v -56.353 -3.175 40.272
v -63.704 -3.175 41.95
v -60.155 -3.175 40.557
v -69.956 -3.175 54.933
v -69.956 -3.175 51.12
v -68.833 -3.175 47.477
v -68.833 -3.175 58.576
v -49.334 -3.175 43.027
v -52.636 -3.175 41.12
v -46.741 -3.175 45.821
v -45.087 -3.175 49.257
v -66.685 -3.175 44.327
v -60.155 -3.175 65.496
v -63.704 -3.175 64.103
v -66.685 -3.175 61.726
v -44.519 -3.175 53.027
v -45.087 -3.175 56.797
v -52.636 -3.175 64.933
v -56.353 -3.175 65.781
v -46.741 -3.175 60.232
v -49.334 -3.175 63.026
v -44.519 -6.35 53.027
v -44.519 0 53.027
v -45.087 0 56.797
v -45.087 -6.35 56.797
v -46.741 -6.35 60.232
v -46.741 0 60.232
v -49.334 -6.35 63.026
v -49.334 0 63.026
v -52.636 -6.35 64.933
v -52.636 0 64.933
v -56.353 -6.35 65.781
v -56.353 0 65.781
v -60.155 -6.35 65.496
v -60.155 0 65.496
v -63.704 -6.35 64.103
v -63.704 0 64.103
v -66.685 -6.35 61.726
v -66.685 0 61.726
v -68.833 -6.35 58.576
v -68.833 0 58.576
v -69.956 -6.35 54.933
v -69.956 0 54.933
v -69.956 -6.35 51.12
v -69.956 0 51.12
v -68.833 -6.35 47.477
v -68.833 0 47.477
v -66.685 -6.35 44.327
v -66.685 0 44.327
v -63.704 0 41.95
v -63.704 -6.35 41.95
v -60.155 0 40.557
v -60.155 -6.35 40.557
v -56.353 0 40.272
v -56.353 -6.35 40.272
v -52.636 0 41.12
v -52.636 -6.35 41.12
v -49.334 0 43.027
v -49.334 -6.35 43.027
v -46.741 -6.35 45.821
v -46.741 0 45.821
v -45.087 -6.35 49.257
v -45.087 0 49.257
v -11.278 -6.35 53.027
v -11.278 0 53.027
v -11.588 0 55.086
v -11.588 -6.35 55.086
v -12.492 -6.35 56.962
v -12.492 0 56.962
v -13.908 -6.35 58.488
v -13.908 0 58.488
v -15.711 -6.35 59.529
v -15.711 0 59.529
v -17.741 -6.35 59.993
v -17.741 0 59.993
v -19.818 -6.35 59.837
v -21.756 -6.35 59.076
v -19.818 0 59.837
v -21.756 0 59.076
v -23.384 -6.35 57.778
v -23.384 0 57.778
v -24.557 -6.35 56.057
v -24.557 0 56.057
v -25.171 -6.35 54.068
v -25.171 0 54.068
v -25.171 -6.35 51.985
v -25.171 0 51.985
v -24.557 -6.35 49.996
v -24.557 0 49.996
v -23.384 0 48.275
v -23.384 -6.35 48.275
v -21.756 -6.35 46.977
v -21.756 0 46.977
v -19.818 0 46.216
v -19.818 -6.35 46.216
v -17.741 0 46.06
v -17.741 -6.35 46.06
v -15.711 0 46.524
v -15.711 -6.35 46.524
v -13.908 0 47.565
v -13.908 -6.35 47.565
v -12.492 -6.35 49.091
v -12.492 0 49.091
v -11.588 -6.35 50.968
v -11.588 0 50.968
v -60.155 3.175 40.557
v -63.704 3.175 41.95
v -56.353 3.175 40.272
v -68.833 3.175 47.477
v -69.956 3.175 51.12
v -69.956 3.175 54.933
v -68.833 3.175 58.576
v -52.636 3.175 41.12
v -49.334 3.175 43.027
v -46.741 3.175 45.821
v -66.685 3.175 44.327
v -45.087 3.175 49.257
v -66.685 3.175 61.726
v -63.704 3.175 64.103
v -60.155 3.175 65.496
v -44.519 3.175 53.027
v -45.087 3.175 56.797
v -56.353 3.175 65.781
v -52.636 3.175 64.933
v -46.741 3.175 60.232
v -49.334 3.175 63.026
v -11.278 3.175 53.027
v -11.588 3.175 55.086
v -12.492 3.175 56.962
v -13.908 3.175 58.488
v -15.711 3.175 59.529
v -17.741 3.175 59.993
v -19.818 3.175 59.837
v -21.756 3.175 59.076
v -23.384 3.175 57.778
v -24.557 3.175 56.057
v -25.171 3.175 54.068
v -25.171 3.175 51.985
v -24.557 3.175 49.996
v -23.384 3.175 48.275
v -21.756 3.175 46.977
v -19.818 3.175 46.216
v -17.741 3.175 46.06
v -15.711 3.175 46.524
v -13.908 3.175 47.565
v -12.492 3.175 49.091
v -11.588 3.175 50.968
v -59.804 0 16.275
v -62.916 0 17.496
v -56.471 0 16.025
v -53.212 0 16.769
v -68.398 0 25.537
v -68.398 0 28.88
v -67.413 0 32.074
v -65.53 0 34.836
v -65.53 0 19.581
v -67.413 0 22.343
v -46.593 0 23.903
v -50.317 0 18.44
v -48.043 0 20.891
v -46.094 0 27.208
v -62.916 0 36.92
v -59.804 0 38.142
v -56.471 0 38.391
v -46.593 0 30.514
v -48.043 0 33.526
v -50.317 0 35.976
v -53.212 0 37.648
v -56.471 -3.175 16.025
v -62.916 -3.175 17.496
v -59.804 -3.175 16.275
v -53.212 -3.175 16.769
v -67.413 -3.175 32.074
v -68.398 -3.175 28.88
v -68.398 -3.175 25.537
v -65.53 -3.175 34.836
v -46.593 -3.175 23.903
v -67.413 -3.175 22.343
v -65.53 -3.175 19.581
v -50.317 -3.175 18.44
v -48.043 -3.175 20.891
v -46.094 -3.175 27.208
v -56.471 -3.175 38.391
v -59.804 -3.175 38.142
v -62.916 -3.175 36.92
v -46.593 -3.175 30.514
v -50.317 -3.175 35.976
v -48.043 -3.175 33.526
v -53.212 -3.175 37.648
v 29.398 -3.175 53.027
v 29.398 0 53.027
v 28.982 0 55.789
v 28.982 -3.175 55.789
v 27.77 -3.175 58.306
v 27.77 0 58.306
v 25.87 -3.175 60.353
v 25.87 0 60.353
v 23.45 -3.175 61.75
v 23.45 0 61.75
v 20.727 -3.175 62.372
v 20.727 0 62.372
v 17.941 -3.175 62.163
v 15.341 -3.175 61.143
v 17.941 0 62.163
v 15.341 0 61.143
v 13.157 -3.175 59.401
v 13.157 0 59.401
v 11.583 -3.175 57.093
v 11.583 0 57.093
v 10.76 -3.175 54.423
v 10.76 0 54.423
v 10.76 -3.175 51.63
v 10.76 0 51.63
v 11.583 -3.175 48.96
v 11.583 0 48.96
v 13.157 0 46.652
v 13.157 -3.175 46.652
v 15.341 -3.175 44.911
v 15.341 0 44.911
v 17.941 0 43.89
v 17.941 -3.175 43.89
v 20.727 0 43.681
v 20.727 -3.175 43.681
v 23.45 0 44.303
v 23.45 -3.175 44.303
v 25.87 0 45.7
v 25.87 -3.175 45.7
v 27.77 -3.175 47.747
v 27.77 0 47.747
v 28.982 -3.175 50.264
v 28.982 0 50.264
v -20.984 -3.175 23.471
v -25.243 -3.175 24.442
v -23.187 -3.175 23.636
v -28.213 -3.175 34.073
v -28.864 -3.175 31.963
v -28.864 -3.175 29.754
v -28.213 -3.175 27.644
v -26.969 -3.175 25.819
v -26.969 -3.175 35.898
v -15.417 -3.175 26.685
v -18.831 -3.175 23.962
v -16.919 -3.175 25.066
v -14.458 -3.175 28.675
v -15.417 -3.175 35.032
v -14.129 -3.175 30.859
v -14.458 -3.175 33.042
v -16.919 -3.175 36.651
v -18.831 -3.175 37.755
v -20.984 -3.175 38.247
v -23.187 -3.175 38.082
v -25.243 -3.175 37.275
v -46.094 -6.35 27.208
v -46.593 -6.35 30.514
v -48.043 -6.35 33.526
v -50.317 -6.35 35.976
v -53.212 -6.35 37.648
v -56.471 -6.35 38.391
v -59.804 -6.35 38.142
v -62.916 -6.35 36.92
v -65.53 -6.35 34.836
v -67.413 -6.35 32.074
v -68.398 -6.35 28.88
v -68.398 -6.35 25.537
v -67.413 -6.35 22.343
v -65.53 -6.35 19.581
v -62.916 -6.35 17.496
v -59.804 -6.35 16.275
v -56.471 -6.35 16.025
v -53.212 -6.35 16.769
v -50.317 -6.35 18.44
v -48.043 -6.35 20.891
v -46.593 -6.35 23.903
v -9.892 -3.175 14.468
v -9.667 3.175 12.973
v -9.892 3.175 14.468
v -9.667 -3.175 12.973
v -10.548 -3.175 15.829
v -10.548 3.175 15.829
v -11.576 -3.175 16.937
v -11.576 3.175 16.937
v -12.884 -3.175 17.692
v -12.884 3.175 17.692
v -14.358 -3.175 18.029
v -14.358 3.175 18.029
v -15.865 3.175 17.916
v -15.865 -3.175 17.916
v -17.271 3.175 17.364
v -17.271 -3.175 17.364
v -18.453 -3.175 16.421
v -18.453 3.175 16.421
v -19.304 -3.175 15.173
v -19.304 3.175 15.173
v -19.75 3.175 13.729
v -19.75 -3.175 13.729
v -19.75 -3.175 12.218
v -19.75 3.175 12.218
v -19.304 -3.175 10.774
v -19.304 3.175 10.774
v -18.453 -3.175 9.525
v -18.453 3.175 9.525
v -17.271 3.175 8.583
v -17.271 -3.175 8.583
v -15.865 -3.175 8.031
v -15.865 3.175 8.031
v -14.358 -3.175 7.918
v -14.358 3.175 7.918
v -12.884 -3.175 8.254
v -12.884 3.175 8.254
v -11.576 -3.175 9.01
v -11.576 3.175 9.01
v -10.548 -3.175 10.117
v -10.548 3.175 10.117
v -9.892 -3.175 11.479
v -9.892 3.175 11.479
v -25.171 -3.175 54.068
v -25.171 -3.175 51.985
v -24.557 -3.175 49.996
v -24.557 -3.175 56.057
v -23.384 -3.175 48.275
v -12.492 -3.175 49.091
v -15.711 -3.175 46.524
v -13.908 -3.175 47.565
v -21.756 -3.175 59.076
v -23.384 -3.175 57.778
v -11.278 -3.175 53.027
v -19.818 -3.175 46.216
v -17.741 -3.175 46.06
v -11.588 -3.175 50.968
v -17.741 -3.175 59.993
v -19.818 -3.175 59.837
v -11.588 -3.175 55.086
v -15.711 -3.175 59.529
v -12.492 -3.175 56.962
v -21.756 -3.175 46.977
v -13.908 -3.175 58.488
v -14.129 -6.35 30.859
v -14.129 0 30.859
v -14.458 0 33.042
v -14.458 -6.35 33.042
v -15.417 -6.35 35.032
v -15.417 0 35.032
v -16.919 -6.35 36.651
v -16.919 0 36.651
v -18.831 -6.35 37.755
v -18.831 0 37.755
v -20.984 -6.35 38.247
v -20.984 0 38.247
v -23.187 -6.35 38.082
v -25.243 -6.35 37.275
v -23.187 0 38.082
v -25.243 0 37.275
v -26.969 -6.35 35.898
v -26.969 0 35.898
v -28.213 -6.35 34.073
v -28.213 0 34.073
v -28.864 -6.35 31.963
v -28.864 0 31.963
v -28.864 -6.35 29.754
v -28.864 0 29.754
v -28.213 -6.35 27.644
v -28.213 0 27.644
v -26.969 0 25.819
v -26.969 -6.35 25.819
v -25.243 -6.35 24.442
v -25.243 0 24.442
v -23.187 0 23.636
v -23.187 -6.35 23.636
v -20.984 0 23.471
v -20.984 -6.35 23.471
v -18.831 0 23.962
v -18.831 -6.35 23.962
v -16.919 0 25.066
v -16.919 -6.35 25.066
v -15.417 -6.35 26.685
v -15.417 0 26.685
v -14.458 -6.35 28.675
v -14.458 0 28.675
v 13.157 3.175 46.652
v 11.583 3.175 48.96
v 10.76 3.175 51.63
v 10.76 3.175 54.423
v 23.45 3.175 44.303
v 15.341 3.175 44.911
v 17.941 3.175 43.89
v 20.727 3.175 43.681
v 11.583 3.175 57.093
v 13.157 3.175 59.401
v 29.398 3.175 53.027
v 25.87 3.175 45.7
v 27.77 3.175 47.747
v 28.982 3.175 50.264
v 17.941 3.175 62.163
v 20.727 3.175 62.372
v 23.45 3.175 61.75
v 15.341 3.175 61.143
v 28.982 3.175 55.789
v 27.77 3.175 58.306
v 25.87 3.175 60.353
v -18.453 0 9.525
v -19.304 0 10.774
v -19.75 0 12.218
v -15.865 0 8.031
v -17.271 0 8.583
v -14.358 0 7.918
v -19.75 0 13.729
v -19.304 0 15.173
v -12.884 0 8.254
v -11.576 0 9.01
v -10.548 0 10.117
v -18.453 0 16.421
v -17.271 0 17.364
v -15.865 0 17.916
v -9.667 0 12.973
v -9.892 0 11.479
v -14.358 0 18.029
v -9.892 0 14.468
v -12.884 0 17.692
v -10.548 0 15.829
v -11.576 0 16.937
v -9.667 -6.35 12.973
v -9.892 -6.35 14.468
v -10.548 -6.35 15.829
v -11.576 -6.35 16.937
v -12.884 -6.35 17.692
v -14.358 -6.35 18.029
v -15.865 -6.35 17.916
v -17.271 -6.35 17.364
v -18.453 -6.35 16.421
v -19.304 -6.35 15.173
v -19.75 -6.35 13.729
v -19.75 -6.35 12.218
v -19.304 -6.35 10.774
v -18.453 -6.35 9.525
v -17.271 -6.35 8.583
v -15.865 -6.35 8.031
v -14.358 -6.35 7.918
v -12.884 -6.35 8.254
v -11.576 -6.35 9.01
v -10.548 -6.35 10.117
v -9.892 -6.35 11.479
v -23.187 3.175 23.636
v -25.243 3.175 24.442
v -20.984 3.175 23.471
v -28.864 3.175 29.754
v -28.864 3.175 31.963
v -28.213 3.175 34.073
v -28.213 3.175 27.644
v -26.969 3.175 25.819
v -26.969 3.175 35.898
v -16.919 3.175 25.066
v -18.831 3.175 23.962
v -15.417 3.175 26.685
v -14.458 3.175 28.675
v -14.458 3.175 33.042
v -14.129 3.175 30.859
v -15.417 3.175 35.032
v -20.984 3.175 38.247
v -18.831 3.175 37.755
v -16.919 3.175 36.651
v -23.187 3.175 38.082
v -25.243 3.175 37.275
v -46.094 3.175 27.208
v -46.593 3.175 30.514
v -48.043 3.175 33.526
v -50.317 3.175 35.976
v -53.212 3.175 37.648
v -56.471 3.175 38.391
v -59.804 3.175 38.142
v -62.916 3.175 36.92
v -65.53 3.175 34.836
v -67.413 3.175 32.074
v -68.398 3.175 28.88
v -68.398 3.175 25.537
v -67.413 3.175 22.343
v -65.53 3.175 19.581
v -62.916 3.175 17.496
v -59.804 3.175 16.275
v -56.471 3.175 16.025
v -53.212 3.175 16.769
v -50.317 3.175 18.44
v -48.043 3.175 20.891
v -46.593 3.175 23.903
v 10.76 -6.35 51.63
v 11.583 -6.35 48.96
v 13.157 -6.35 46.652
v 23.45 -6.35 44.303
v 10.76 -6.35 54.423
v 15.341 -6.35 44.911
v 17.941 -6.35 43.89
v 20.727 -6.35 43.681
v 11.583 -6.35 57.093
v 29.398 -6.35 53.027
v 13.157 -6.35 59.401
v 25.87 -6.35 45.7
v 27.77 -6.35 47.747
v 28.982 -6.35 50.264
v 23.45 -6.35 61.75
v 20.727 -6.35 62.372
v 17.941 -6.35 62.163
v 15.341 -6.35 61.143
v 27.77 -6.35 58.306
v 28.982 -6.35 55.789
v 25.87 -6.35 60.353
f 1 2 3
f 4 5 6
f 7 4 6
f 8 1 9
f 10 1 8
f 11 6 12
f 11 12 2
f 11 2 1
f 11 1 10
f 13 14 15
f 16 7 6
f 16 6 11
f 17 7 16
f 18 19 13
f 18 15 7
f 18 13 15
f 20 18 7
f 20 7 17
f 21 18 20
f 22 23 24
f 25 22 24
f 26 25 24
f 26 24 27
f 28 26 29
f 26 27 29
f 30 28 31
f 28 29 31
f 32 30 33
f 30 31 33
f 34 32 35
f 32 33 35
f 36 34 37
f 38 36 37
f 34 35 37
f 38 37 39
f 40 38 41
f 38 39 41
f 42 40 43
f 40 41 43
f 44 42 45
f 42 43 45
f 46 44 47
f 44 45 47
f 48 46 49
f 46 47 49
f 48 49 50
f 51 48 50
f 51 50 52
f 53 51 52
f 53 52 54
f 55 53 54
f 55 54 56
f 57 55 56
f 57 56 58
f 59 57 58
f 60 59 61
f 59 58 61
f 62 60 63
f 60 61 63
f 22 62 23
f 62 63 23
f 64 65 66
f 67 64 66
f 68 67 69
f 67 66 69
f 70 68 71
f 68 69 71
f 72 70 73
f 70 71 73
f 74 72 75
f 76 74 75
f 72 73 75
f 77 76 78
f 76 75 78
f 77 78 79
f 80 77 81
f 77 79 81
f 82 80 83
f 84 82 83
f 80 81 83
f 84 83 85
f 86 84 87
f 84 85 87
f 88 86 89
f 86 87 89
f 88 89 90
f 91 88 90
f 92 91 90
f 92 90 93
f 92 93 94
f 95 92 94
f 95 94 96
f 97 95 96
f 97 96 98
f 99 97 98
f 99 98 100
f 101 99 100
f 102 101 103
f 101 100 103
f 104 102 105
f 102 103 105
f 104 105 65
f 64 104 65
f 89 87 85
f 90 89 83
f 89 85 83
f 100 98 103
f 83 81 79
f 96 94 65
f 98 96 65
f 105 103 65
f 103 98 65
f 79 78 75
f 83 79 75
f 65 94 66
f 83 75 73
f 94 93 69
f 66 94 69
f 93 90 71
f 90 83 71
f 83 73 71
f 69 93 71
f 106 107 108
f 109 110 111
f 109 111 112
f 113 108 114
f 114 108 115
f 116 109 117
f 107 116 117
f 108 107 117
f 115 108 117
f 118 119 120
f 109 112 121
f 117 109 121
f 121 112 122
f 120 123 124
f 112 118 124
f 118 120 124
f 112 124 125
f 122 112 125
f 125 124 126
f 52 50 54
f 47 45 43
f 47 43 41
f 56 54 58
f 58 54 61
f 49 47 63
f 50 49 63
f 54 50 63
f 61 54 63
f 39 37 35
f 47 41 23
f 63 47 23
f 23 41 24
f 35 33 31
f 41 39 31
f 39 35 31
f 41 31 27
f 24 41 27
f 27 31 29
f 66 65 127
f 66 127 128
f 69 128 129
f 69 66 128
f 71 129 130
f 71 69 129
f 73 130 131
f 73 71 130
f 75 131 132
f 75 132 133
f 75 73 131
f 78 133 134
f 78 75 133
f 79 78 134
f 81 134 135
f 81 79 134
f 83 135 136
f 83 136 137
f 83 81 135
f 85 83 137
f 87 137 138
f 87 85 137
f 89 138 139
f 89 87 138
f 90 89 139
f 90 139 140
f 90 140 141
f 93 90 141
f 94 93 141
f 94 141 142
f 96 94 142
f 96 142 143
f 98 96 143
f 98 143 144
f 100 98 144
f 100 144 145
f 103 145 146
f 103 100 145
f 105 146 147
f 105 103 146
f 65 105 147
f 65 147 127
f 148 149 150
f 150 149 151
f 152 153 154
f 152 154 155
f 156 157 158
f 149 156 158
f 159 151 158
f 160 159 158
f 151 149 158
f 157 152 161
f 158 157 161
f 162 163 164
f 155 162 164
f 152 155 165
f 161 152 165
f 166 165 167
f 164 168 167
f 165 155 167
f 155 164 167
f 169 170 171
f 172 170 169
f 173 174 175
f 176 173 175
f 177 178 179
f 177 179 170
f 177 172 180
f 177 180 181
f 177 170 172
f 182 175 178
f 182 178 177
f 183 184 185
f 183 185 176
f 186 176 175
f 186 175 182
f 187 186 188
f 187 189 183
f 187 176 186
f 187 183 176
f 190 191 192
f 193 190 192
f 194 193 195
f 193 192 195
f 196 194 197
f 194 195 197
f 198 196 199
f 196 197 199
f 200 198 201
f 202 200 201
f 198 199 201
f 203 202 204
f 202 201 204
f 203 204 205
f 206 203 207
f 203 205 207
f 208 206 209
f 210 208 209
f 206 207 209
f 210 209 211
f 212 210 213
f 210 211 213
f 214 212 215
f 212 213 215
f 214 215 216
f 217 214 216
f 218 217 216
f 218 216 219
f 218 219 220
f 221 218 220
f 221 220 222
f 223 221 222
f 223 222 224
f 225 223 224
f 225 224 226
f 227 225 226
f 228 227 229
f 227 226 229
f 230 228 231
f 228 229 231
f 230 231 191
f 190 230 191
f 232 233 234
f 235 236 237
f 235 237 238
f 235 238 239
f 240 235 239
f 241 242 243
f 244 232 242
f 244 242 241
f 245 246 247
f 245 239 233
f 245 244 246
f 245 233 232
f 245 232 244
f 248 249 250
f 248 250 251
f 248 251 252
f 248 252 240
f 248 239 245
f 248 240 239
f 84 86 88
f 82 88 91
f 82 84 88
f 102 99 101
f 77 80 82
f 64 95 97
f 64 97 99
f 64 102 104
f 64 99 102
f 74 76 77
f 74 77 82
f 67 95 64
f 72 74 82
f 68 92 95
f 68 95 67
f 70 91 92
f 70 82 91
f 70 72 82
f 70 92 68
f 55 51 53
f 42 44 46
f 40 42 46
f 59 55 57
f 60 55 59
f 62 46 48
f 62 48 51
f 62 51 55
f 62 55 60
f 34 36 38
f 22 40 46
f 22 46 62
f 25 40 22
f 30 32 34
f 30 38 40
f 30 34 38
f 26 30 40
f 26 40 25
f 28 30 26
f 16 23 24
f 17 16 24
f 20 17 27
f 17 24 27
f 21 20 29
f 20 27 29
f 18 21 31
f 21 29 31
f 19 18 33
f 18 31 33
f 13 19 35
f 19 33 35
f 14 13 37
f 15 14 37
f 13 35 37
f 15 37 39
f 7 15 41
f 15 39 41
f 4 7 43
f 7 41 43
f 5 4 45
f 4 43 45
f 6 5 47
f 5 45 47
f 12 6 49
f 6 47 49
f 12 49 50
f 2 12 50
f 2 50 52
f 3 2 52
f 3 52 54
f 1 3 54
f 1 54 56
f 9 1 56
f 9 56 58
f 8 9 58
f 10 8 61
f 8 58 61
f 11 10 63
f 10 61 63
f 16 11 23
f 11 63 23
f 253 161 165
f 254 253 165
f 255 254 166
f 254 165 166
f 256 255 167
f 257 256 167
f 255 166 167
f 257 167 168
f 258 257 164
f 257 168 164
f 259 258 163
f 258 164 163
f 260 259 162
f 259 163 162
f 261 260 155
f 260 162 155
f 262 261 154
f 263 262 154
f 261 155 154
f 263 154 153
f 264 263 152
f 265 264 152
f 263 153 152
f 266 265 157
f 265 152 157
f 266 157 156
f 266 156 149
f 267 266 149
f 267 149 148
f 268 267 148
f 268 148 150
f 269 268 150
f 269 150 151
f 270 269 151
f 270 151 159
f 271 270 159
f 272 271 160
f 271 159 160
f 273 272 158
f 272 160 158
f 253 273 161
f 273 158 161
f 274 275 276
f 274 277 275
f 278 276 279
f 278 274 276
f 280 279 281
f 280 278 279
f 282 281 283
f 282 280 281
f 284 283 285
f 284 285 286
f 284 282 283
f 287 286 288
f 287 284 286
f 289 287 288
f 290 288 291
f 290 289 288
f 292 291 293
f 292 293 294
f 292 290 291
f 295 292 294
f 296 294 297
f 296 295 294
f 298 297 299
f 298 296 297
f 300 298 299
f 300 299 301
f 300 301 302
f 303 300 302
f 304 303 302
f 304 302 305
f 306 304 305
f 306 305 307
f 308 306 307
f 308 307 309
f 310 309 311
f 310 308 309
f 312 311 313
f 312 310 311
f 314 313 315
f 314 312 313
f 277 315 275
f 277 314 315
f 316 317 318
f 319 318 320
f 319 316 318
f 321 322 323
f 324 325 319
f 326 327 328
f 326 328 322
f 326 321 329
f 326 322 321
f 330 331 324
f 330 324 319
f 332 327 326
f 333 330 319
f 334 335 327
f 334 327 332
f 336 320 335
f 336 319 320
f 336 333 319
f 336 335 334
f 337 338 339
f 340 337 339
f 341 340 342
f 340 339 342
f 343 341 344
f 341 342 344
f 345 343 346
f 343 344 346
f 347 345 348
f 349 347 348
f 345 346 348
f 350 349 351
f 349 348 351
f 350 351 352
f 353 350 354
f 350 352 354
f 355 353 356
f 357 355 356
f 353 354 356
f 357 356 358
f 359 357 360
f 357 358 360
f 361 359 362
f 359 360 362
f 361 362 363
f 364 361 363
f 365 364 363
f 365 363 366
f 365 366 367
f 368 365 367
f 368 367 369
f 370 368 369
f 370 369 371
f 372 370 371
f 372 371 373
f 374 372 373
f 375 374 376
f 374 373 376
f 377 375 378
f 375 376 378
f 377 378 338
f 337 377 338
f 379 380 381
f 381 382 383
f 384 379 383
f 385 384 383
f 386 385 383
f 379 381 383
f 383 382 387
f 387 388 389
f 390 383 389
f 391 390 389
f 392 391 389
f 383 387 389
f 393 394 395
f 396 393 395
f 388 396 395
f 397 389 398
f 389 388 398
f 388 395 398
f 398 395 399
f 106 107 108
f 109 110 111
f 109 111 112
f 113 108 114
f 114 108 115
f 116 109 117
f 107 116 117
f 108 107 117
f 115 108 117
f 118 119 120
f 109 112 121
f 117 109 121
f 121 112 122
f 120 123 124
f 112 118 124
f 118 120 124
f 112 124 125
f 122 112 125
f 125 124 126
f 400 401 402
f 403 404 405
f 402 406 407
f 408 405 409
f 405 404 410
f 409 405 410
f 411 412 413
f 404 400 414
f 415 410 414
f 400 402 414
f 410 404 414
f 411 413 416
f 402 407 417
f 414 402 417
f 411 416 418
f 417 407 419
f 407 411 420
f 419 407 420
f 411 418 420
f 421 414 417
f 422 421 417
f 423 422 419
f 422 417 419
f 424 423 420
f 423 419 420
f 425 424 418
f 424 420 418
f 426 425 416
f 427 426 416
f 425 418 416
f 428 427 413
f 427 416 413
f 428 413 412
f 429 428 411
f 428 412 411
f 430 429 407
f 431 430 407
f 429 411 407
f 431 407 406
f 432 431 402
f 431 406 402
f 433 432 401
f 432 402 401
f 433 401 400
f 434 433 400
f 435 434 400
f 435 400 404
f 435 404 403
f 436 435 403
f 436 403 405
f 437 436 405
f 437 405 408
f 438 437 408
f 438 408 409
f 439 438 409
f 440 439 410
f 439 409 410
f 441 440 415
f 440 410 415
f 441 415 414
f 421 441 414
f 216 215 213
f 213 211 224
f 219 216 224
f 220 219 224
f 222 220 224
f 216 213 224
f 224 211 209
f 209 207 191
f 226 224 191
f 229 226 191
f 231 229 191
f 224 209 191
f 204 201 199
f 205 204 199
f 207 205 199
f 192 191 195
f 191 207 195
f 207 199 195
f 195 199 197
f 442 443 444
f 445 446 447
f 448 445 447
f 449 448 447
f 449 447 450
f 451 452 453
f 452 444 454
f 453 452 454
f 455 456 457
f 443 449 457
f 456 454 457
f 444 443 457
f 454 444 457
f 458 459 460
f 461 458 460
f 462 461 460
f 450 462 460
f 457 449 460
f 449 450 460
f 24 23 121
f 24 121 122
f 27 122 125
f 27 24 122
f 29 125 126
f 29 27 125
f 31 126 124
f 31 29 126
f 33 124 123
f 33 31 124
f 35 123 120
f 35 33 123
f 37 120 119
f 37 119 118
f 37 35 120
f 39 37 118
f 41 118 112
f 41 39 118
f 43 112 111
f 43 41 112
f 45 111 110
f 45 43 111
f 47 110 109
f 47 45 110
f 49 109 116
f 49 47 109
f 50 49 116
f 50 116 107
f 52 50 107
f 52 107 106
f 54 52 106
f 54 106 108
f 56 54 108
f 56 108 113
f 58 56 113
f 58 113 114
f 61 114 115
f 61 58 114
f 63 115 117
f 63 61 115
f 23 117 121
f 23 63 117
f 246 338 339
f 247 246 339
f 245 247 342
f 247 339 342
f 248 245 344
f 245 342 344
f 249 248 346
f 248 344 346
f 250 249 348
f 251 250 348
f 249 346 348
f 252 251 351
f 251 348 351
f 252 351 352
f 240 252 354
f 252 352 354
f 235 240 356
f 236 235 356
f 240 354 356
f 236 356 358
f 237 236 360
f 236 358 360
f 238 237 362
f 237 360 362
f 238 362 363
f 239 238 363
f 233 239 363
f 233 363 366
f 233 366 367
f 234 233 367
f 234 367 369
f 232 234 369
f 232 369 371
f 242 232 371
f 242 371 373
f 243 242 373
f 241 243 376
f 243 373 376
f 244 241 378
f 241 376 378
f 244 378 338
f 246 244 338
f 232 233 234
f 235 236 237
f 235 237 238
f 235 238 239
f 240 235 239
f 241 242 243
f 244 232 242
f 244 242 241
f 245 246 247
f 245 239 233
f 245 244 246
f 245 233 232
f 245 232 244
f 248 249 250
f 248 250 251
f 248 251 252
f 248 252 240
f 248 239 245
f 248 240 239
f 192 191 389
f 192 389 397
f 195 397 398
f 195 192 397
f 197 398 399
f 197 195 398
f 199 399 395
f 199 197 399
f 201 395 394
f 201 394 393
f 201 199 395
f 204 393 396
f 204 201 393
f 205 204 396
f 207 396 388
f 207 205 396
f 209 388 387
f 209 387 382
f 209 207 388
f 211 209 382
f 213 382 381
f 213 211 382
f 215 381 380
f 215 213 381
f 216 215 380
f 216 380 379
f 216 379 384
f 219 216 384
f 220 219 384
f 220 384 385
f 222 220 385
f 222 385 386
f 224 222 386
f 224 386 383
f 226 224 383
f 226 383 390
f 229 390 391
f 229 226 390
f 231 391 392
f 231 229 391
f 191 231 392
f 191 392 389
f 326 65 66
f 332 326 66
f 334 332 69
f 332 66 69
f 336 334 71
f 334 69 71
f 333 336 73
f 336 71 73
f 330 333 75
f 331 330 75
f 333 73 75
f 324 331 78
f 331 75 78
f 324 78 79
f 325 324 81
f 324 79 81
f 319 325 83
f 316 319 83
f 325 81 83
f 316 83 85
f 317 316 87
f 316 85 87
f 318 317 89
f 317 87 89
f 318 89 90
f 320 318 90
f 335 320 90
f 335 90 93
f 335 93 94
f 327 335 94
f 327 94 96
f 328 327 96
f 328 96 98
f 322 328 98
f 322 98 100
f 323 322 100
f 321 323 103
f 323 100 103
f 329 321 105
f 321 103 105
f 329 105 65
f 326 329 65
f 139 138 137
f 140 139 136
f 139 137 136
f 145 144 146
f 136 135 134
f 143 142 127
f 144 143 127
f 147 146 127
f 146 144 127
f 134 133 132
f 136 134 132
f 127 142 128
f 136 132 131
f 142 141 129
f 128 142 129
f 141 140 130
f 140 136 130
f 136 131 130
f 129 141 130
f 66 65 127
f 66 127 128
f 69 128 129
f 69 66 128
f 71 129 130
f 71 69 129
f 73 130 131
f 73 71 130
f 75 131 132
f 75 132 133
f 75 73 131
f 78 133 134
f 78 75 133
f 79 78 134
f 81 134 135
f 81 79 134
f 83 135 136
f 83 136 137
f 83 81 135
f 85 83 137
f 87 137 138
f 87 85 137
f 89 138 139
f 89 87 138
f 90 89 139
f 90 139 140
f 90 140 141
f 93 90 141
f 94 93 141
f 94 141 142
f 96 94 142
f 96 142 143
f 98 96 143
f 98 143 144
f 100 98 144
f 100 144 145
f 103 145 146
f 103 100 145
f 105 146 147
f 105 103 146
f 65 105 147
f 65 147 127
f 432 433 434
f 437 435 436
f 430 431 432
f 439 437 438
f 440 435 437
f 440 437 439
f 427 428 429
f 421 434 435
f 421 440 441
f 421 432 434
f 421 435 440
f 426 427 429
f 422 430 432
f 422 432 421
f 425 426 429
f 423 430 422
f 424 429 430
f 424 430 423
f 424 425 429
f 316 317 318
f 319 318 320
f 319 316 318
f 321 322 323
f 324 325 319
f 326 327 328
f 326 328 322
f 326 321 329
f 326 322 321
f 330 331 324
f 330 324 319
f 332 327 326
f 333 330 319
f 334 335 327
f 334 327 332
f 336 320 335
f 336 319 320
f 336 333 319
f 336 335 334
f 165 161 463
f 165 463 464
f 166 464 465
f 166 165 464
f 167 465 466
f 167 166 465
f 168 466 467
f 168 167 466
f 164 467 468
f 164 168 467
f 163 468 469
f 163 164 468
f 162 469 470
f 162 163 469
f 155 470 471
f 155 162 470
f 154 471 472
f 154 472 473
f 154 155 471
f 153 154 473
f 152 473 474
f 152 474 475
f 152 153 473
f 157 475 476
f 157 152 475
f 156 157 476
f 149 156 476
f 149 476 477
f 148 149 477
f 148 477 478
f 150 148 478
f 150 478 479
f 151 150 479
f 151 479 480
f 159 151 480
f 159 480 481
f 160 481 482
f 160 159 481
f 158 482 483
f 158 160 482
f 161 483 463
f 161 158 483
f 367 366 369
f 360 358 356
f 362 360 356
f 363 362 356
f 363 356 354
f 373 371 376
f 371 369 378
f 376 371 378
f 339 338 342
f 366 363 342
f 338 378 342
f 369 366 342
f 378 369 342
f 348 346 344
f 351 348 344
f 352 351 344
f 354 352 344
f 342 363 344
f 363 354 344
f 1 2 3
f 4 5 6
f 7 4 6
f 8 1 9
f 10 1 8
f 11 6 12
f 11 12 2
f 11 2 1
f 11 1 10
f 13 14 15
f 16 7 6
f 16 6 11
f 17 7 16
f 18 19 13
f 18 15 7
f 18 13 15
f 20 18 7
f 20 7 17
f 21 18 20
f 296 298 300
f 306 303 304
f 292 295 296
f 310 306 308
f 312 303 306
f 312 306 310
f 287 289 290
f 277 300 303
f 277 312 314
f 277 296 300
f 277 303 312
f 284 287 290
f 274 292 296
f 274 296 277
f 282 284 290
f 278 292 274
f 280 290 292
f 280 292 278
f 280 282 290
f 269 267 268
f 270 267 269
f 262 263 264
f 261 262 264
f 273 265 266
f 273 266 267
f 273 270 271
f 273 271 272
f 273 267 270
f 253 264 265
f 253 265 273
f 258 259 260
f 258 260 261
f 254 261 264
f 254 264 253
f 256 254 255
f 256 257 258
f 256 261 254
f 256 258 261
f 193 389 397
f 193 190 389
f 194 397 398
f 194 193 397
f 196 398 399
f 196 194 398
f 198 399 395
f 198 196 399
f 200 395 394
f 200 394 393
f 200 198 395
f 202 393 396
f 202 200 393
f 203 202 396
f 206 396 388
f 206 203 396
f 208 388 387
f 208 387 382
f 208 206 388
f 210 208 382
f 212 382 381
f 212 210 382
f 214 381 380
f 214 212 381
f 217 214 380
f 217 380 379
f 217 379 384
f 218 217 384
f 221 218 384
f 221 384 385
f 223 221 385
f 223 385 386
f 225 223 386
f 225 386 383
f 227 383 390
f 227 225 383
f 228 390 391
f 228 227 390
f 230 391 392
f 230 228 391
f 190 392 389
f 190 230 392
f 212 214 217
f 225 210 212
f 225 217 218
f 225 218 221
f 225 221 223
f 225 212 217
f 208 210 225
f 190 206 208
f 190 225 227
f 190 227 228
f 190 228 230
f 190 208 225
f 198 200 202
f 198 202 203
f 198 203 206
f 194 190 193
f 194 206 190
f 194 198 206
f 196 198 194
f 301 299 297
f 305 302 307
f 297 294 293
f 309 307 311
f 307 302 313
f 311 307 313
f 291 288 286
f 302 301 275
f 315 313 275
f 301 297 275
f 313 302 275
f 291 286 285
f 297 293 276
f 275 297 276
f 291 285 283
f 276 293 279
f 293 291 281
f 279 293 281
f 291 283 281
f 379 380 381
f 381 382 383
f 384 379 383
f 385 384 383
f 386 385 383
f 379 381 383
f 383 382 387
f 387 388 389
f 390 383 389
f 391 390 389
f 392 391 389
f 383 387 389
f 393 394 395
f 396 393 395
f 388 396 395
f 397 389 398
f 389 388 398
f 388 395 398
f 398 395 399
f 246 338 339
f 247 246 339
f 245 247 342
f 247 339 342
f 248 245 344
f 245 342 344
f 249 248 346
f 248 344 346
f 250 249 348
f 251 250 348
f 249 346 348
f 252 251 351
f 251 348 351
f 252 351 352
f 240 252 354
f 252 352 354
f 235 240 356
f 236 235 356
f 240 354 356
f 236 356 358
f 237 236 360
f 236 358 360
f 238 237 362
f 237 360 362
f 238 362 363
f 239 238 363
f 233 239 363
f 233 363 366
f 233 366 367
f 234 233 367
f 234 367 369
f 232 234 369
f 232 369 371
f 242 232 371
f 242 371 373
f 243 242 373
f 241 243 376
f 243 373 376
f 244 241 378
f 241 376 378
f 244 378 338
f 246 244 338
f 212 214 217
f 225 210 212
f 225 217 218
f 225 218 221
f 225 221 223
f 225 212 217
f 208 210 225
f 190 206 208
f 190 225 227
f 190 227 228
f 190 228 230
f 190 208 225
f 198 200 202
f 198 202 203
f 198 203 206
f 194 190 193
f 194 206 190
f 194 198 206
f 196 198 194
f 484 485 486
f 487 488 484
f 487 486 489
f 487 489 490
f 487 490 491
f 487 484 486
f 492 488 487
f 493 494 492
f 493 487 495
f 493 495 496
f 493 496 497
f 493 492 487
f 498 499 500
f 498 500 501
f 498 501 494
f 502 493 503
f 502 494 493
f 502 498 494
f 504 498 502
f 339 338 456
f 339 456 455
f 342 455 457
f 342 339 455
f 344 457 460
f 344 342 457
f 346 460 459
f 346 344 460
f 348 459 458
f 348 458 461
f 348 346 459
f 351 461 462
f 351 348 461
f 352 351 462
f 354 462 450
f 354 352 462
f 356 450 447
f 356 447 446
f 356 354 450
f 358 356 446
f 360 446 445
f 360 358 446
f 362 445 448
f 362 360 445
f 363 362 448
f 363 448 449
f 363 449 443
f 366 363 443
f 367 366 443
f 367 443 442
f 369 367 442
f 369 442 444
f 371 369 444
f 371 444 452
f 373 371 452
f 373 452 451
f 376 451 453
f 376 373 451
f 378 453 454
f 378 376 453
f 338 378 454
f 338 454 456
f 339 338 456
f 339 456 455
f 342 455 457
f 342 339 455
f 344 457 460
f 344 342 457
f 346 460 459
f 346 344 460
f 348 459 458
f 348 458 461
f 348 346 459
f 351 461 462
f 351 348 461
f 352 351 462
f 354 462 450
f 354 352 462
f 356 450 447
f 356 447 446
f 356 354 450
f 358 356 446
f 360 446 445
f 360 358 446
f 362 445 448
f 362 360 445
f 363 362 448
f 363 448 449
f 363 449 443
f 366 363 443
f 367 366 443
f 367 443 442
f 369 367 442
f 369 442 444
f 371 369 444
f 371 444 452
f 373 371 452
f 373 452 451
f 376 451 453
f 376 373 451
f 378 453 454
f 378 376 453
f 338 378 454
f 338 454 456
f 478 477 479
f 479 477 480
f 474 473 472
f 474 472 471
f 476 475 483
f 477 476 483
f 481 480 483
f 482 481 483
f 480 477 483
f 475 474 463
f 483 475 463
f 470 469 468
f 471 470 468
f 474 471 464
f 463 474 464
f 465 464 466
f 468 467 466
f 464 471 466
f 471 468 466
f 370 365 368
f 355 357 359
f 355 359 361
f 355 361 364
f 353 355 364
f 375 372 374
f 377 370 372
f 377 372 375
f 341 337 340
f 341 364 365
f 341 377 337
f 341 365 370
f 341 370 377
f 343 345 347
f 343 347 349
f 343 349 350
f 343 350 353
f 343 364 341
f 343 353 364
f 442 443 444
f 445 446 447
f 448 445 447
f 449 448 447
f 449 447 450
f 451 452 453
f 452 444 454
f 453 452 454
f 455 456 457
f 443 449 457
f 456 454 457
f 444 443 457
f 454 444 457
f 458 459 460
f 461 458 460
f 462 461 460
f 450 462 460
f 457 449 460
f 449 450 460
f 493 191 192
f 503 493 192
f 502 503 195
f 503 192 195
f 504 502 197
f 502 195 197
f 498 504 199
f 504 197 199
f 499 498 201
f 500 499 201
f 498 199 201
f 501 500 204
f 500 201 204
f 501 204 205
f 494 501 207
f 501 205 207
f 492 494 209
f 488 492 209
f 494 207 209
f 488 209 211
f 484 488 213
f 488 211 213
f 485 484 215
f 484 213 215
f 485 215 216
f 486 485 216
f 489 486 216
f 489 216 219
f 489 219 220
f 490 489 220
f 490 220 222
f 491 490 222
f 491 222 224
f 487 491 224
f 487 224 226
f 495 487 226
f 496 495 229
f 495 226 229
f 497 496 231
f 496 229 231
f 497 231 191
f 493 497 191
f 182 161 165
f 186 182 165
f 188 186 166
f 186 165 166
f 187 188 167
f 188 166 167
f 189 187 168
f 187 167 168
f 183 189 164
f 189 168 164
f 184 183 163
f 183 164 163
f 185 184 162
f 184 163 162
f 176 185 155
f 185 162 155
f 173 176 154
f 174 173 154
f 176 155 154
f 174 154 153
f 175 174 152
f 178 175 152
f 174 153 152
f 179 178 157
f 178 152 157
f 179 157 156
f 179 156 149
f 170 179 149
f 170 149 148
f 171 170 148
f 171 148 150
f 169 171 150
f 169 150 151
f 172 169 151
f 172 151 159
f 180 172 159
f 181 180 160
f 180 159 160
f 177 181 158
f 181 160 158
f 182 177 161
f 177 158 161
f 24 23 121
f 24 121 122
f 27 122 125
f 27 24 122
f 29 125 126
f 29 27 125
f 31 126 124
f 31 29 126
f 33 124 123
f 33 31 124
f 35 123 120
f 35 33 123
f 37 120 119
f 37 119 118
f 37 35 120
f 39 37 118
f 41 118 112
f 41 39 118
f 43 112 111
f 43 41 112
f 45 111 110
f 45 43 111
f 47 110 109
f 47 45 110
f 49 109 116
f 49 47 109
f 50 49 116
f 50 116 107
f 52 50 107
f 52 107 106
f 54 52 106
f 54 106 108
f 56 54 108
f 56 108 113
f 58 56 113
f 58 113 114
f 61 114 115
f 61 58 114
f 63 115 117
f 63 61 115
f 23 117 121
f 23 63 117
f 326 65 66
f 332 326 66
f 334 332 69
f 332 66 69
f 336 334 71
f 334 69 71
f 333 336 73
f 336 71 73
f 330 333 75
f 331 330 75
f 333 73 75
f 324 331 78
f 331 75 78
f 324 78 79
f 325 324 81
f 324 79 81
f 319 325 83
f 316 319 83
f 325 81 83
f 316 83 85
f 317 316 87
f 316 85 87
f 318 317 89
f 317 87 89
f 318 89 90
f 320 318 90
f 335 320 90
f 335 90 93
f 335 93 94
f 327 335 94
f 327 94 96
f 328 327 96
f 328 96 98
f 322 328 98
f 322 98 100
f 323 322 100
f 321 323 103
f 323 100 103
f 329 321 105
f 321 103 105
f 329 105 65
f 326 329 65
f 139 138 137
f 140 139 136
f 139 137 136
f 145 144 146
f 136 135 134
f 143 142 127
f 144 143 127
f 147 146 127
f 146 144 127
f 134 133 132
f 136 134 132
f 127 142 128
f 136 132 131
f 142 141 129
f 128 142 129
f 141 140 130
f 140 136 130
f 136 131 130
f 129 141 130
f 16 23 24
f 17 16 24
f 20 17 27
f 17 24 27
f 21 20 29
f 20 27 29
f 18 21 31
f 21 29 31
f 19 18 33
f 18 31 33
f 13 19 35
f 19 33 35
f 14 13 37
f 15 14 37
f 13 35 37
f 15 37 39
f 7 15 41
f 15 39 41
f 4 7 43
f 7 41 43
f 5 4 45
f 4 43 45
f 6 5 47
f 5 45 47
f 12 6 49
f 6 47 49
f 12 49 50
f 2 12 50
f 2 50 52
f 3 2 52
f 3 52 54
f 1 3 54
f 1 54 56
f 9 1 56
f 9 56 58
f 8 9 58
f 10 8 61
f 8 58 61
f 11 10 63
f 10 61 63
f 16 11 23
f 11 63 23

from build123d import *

# Parameters (mm, degrees)
F0_R     = 12.79036
F0_R_2   = 6.985614
F0_R_3   = 7.408825
F0_R_4   = 9.371506
F1_DEPTH = 3.175
F0_R_5   = 11.214485
F0_R_6   = 5.069543
F2_DEPTH = 3.175
F3_DEPTH = 6.35


with BuildPart() as f1:
    # F0 (on Front) → F1 (new body, symmetric)
    with BuildSketch(Plane.XZ):
        with Locations((-57.308979, 53.02655)):
            Circle(F0_R)
        with Locations((-18.263301, 53.02655)):
            Circle(F0_R_2)
        with Locations((-21.538099, 30.858679)):
            Circle(F0_R_3)
        with Locations((20.026654, 53.02655)):
            Circle(F0_R_4)
    extrude(amount=F1_DEPTH, both=True)


with BuildPart() as f2:
    # F0 (on Front) → F2 (new body, symmetric)
    with BuildSketch(Plane.XZ):
        with Locations((-57.308979, 53.02655)):
            Circle(F0_R)
        with Locations((-21.538099, 30.858679)):
            Circle(F0_R_3)
        with Locations((-18.263301, 53.02655)):
            Circle(F0_R_2)
        with Locations((20.026654, 53.02655)):
            Circle(F0_R_4)
        with Locations((-57.308979, 27.208291)):
            Circle(F0_R_5)
        with Locations((-14.736595, 12.973242)):
            Circle(F0_R_6)
    extrude(amount=F2_DEPTH, both=True)


with BuildPart() as f3:
    # F0 (on Front) → F3 (new body)
    with BuildSketch(Plane.XZ):
        with Locations((-57.308979, 53.02655)):
            Circle(F0_R)
        with Locations((-21.538099, 30.858679)):
            Circle(F0_R_3)
        with Locations((-18.263301, 53.02655)):
            Circle(F0_R_2)
        with Locations((20.026654, 53.02655)):
            Circle(F0_R_4)
        with Locations((-57.308979, 27.208291)):
            Circle(F0_R_5)
        with Locations((-14.736595, 12.973242)):
            Circle(F0_R_6)
    extrude(amount=F3_DEPTH)


solid = Compound([f1.part, f2.part, f3.part])
